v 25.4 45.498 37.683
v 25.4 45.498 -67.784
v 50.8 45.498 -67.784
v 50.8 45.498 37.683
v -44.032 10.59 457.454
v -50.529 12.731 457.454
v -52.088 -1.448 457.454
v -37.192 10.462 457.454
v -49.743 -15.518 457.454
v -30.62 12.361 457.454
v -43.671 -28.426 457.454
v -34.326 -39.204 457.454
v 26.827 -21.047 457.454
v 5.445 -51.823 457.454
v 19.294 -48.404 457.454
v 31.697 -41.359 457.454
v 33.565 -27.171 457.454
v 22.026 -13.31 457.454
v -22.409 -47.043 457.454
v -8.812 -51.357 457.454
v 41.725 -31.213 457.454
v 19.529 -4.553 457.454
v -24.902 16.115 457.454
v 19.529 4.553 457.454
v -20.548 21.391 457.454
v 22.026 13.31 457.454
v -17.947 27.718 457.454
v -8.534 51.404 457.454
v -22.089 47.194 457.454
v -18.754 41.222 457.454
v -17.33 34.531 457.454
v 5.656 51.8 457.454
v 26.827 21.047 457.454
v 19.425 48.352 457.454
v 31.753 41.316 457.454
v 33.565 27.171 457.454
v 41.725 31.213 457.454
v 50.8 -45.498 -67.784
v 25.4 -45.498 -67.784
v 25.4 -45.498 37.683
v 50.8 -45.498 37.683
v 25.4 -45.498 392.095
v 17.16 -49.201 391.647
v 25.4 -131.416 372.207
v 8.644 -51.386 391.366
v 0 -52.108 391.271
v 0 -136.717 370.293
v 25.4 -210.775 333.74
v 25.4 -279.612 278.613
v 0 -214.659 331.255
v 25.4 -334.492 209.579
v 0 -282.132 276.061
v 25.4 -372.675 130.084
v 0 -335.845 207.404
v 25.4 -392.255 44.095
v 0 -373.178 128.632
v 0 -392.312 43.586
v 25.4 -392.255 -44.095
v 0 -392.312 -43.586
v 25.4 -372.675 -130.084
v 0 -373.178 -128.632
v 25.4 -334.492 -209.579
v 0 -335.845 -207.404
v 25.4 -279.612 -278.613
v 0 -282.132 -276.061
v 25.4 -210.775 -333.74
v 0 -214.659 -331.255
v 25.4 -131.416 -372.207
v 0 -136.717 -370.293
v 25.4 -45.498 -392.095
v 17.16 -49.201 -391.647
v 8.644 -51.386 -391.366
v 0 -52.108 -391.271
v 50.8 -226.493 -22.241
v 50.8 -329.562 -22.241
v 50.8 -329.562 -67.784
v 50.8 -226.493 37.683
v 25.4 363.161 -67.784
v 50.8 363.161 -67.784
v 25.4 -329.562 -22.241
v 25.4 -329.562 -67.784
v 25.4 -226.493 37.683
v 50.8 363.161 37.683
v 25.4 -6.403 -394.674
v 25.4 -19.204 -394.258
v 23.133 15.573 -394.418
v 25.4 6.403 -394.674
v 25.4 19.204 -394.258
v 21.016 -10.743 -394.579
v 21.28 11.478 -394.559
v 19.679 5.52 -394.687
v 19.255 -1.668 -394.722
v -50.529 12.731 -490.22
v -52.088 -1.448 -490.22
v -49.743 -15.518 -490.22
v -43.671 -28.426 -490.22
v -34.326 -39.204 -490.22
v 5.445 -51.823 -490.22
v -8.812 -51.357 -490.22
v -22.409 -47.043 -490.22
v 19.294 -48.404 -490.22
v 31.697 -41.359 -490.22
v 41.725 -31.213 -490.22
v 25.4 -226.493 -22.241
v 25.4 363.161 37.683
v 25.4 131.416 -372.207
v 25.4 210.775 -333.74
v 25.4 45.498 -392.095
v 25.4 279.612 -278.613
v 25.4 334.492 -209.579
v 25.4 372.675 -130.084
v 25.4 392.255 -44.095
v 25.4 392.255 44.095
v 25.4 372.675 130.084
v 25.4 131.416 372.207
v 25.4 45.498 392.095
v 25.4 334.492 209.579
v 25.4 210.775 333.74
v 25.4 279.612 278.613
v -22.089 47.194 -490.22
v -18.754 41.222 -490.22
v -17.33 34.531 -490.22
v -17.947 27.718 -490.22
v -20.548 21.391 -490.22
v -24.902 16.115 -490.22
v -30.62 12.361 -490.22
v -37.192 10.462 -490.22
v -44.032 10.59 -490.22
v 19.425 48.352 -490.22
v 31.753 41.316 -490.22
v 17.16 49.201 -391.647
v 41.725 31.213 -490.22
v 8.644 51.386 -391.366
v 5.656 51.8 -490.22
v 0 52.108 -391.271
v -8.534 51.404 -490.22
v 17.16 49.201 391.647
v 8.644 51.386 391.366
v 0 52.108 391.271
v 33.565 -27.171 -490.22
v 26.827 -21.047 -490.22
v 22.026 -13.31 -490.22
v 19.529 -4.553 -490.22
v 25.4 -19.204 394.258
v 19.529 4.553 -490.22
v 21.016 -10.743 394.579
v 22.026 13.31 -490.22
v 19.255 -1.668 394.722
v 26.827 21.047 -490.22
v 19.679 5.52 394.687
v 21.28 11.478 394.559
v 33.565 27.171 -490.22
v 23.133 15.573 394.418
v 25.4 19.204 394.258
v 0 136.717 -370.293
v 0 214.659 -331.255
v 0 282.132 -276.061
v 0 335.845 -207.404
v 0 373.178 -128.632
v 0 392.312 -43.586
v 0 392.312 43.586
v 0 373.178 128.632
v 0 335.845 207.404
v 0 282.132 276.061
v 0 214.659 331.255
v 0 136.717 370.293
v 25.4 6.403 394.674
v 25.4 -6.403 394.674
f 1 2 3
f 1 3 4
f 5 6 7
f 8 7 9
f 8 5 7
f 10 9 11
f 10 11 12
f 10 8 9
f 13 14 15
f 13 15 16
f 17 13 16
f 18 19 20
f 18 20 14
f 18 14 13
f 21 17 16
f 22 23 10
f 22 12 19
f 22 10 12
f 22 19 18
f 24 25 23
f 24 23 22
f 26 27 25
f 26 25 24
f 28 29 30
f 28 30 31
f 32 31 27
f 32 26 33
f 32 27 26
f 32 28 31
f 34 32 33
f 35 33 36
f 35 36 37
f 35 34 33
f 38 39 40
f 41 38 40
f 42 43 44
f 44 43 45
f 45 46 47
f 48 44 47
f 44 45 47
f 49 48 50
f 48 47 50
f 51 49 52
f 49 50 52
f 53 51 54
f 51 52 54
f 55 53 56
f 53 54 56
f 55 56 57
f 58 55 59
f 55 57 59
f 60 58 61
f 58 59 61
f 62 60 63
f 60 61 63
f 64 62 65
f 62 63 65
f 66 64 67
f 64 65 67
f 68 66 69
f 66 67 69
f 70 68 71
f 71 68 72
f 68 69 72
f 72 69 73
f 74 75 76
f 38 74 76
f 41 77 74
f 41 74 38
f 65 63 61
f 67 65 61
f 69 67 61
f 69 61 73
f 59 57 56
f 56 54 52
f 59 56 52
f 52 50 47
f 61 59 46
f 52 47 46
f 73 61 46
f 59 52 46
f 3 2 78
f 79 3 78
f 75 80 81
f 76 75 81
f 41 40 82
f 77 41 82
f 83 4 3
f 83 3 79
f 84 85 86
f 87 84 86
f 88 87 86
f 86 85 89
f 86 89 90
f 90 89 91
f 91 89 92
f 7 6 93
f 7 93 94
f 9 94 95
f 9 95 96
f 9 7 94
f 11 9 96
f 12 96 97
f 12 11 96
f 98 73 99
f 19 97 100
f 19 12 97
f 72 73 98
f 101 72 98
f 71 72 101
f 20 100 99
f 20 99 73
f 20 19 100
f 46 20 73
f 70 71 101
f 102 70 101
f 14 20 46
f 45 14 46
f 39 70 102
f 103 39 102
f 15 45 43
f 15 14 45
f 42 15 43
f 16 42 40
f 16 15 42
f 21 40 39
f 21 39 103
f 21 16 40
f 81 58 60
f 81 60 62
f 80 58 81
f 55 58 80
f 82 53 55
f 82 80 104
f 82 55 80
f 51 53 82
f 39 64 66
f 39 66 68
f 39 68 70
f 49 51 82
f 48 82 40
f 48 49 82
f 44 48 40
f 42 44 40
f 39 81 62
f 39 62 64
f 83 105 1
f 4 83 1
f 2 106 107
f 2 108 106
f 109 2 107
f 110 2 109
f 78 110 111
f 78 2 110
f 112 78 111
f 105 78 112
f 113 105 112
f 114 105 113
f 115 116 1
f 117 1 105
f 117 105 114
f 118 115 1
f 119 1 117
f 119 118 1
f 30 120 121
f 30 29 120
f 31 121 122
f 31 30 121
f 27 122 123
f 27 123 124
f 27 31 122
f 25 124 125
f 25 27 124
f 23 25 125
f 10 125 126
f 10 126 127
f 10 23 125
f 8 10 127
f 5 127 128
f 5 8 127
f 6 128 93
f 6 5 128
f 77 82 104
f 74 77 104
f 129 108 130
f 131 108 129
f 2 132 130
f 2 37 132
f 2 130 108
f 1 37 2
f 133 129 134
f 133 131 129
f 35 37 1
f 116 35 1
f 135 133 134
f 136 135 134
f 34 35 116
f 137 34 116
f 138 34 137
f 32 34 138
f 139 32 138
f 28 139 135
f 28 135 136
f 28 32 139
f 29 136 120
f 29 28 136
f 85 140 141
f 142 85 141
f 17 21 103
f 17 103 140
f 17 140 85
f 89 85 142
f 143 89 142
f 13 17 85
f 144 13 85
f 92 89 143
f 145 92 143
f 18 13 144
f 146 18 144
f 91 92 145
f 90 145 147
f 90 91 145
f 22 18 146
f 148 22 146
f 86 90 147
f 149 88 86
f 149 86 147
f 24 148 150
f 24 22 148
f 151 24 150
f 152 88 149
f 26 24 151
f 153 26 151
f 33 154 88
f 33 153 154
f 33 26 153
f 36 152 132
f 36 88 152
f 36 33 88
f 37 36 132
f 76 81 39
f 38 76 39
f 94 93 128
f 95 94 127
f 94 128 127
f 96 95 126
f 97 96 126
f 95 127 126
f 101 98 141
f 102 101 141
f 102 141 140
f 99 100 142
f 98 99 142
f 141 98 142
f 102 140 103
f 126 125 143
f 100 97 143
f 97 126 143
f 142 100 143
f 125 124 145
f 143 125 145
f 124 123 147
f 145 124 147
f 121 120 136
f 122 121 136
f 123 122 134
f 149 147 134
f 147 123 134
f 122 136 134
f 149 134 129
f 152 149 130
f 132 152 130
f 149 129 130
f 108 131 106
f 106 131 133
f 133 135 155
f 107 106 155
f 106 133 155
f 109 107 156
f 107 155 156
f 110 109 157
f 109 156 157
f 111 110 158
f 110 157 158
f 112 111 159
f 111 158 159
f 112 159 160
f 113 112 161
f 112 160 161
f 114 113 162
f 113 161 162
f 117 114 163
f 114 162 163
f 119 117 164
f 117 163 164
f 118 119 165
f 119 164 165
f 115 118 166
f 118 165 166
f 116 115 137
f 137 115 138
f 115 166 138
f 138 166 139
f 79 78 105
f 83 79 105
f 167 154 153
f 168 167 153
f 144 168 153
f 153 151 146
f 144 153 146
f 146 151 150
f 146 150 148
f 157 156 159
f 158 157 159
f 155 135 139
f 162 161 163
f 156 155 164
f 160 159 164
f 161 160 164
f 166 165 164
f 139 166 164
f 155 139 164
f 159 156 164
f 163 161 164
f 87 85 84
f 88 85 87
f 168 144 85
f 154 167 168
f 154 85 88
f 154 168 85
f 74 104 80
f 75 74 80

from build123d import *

# Parameters (mm, degrees)
F1_DEPTH  = 34.29
F2_DEPTH  = 36.068
F3_DEPTH  = 89.916
F4_DEPTH  = 297.18
F5_DEPTH  = 490.22
F7_DEPTH  = 25.4
F8_DEPTH  = 25.4
F9_R      = 267.1036956646
F10_DEPTH = 25.4
F11_R     = 394.725466742
F12_DEPTH = 25.4


with BuildPart() as f1:
    # F0 (on Top) → F1 (new body)
    with BuildSketch(Plane.XY):
        with BuildLine():
            ThreePointArc((-22.0894133395, 47.1940784517), (-22.5272575475, 18.5898560115), (-50.5285451852, 12.7314313437))
            ThreePointArc((-50.5285451852, 12.7314313437), (-22.4090369372, -47.0431534459), (41.7246328393, -31.2134303949))
            ThreePointArc((41.7246328393, -31.2134303949), (19.2126905803, 0), (41.7246328393, 31.2134303949))
            ThreePointArc((41.7246328393, 31.2134303949), (12.6582281257, 50.5469334709), (-22.0894133395, 47.1940784517))
        make_face()
    extrude(amount=F1_DEPTH)

    # F2 (add): a face of the model
    f2_faces = [f1.faces().sort_by_distance(p)[0] for p in [
        (-4.6967293791, -3.1263412286, 34.29),
    ]]
    extrude(f2_faces, amount=F2_DEPTH)

    # F3 (add): a face of the model
    f3_faces = [f1.faces().sort_by_distance(p)[0] for p in [
        (-4.6967293791, -3.1263412286, 70.358),
    ]]
    extrude(f3_faces, amount=F3_DEPTH)

    # F4 (add): a face of the model
    f4_faces = [f1.faces().sort_by_distance(p)[0] for p in [
        (-4.6967293791, -3.1263412286, 160.274),
    ]]
    extrude(f4_faces, amount=F4_DEPTH)

    # F5 (add): a face of the model
    f5_faces = [f1.faces().sort_by_distance(p)[0] for p in [
        (-4.6967293791, -3.1263412286, 0),
    ]]
    extrude(f5_faces, amount=F5_DEPTH)

    # F6 (on Right) → F7 (join)
    with BuildSketch(Plane.YZ):
        Polygon((-226.492524147, -22.241378203), (-329.5620381832, -22.241378203), (-329.5620381832, -67.7837207913), (363.1609678268, -67.7837207913), (363.1609678268, 37.6827605069), (-226.492524147, 37.6827605069), align=None)
    extrude(amount=F7_DEPTH)

    # F8 (add): faces of the model
    f8_faces = [f1.faces().sort_by_distance(p)[0] for p in [
        (25.4, -164.0280914182, -20.9640918351),
        (25.4, 204.3294576408, -15.0504801422),
    ]]
    extrude(f8_faces, amount=F8_DEPTH)

    # F9 (on Right) → F10 (join)
    with BuildSketch(Plane.YZ):
        Circle(F9_R)
    extrude(amount=F10_DEPTH)

    # F11 (on Right) → F12 (join)
    with BuildSketch(Plane.YZ):
        Circle(F11_R)
    extrude(amount=F12_DEPTH)


solid = f1.part
